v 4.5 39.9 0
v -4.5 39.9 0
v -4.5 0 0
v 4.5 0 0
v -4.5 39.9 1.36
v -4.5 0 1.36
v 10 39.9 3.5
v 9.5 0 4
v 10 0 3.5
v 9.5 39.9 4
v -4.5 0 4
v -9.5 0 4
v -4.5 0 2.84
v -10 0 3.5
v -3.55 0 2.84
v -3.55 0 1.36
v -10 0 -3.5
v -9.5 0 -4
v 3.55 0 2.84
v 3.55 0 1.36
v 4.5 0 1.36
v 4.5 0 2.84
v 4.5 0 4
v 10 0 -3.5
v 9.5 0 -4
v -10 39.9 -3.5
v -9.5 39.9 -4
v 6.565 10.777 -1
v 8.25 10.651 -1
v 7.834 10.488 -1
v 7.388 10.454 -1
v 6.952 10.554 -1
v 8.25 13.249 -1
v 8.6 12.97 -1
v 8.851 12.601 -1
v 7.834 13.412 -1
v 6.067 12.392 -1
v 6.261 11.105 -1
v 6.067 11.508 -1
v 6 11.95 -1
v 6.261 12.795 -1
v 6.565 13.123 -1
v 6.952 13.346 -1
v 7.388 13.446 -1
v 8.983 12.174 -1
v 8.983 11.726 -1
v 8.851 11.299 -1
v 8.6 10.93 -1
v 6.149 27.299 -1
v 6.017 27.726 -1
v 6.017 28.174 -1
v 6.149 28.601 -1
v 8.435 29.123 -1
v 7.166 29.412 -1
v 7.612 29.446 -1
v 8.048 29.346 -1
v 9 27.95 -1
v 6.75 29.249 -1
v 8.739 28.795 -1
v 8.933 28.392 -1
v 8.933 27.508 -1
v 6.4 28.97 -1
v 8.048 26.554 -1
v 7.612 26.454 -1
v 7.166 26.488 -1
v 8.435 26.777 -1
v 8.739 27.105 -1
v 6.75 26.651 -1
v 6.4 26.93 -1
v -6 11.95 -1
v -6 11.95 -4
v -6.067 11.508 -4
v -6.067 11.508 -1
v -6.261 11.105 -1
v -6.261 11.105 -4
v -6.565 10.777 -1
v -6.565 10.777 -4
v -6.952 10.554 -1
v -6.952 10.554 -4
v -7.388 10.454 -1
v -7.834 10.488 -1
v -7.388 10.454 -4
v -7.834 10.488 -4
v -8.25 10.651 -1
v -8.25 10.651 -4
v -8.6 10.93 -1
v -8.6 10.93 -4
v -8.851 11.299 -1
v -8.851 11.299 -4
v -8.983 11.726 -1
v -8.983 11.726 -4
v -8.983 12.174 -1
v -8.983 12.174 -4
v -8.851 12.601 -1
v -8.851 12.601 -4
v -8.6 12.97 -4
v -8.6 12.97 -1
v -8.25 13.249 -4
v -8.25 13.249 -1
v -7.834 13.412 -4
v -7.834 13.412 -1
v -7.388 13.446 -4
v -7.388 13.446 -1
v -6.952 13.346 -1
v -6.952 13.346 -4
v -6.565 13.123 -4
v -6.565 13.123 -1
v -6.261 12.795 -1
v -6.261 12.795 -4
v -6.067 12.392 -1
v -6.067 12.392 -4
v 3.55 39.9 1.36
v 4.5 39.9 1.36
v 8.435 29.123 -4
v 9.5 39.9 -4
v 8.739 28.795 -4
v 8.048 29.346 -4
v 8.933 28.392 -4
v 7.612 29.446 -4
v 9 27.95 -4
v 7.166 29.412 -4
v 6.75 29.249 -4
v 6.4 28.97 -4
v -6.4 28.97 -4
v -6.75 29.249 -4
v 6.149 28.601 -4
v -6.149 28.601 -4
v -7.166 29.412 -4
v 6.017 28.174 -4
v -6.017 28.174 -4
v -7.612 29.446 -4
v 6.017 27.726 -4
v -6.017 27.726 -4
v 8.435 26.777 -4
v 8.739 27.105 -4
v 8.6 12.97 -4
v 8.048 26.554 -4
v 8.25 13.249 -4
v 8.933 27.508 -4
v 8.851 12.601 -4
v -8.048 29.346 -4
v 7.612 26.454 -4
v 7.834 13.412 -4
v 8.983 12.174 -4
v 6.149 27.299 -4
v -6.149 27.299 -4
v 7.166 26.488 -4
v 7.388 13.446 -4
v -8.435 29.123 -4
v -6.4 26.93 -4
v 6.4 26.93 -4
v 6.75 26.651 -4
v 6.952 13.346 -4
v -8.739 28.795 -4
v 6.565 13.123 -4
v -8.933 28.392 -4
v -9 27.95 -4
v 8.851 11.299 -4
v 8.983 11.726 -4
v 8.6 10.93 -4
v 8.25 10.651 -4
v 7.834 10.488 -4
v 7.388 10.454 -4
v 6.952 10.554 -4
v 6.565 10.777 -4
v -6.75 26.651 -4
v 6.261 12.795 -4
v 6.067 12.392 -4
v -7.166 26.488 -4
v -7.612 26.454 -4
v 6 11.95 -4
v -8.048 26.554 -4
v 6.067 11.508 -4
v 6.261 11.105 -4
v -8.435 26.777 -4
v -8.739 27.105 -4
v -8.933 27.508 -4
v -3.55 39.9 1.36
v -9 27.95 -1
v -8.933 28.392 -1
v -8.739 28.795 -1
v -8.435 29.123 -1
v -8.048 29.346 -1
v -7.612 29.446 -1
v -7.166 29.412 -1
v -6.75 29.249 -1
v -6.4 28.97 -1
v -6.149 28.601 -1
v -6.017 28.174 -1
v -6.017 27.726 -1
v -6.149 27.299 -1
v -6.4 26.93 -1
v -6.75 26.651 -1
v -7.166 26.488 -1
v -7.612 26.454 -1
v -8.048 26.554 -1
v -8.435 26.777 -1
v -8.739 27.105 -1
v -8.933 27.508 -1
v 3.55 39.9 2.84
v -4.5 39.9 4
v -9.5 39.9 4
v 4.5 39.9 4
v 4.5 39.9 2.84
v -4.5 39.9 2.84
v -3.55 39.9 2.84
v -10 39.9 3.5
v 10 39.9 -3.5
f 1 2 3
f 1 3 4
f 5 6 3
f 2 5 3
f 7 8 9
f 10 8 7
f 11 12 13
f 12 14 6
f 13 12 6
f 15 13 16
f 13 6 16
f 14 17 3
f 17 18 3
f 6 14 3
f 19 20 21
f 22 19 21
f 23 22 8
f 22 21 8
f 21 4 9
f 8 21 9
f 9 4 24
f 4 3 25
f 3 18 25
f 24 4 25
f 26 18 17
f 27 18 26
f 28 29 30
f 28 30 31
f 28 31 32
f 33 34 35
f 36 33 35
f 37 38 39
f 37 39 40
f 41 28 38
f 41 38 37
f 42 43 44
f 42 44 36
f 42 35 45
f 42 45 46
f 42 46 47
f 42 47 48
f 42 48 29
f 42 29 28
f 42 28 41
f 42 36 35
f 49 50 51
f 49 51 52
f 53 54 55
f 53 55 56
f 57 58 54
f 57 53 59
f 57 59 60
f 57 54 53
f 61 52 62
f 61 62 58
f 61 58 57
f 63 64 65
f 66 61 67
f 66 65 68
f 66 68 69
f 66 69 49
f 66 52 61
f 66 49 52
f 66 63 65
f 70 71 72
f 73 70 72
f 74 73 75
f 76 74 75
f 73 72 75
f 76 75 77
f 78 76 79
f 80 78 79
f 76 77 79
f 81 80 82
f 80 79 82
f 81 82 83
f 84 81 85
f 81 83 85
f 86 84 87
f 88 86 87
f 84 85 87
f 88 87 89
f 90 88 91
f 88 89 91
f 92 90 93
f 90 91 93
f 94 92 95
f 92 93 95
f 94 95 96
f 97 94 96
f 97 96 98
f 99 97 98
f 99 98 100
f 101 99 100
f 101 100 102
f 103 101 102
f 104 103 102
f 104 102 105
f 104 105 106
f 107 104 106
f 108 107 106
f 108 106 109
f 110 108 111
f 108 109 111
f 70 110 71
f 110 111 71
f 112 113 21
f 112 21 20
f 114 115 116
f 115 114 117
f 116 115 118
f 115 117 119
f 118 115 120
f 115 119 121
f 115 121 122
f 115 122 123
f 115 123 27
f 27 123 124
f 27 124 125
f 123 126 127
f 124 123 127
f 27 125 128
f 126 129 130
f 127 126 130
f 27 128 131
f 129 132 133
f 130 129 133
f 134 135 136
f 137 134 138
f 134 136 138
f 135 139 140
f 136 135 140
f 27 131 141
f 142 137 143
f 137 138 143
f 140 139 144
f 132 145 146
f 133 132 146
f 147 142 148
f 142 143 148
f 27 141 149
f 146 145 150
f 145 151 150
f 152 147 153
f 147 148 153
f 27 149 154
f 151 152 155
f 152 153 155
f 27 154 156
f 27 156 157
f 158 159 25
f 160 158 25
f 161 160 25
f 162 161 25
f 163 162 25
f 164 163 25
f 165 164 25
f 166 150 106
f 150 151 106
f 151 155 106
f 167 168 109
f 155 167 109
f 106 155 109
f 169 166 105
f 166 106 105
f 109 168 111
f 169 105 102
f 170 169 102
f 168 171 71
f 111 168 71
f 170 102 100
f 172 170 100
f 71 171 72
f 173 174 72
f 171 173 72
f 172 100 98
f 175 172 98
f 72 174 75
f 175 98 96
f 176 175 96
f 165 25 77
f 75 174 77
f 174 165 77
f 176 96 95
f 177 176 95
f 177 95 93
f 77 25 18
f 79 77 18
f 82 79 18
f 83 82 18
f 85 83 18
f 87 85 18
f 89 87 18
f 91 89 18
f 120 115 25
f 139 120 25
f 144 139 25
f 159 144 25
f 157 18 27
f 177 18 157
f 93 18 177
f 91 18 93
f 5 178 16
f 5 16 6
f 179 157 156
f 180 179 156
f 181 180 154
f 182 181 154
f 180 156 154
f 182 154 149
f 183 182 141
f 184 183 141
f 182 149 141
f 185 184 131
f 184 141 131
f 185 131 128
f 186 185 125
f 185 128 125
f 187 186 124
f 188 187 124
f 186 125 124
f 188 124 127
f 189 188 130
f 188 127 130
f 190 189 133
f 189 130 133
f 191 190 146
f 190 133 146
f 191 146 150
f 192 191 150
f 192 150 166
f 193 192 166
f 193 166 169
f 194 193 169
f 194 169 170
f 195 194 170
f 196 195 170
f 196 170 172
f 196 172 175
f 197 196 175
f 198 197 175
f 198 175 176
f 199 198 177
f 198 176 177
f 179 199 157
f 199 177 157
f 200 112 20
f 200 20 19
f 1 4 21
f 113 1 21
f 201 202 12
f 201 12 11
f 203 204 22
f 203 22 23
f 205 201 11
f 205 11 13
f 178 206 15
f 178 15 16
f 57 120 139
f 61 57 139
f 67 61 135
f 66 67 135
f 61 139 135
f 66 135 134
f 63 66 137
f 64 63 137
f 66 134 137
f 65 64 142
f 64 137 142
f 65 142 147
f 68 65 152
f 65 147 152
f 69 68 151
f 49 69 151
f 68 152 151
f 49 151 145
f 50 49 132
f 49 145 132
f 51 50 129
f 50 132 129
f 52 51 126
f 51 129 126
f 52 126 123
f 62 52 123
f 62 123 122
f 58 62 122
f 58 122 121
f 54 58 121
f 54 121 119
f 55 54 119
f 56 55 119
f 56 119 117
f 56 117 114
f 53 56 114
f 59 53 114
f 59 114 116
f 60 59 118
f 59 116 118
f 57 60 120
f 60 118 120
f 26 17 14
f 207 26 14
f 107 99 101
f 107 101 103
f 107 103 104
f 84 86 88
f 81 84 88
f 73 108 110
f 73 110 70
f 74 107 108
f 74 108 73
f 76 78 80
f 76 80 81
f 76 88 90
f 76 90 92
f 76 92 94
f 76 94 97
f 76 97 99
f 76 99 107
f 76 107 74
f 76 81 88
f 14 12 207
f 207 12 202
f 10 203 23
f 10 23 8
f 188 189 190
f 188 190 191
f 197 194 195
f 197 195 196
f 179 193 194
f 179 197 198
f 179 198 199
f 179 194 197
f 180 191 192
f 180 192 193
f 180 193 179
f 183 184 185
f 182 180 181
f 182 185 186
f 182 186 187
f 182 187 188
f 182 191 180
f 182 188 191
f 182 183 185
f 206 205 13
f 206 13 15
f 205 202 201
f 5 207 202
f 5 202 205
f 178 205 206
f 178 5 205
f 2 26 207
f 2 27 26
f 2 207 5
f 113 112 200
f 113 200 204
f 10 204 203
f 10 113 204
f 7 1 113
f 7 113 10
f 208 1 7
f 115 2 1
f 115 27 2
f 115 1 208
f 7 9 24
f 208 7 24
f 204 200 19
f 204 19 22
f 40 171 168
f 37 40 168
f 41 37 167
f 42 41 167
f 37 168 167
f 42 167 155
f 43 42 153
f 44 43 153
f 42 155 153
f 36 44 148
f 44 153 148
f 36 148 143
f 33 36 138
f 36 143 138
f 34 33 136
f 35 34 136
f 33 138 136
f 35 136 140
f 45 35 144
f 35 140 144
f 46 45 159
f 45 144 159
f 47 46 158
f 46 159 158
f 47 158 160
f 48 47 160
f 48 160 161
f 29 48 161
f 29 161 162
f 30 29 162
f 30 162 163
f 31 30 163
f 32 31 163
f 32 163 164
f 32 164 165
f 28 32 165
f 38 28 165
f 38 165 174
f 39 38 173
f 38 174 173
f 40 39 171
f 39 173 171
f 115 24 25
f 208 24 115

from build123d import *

# Parameters (mm, degrees)
EXTRUDE_1_DEPTH     = 39.9
SKETCH_2_R          = 1.5
CUT_EXTRUDE_1_DEPTH = 3
CHAMFER_1_SIZE      = 0.5


with BuildPart() as part:
    # 草图1 → 凸台-拉伸1 (new body)
    with BuildSketch(Plane(origin=(0, 0, 0), x_dir=(1, 0, 0), z_dir=(0, 1, 0))):
        Polygon((-10, 4), (-10, -4), (-4.5, -4), (-4.5, -2.84), (-3.55, -2.84), (-3.55, -1.36), (-4.5, -1.36), (-4.5, 0), (4.5, 0), (4.5, -1.36), (3.55, -1.36), (3.55, -2.84), (4.5, -2.84), (4.5, -4), (10, -4), (10, 4), align=None)
    extrude(amount=EXTRUDE_1_DEPTH)

    # 草图2 → 切除-拉伸1 (cut)
    with BuildSketch(Plane(origin=(0, 0, -4), x_dir=(-1, 0, 0), z_dir=(0, 0, -1))):
        with Locations((7.5, 27.95)):
            Circle(SKETCH_2_R)
        with Locations(Location((-7.5, 27.95, 0), (0, 0, 180))):
            Circle(SKETCH_2_R)
        with Locations(Location((7.5, 11.95, 0), (0, 0, 180))):
            Circle(SKETCH_2_R)
        with Locations((-7.5, 11.95)):
            Circle(SKETCH_2_R)
    extrude(amount=-CUT_EXTRUDE_1_DEPTH, mode=Mode.SUBTRACT)

    # 倒角1
    chamfer_1_edges = [part.edges().sort_by_distance(p)[0] for p in [
        (-10, 19.95, 4),
        (-10, 19.95, -4),
        (10, 19.95, -4),
        (10, 19.95, 4),
    ]]
    chamfer(chamfer_1_edges, length=CHAMFER_1_SIZE)


solid = part.part
